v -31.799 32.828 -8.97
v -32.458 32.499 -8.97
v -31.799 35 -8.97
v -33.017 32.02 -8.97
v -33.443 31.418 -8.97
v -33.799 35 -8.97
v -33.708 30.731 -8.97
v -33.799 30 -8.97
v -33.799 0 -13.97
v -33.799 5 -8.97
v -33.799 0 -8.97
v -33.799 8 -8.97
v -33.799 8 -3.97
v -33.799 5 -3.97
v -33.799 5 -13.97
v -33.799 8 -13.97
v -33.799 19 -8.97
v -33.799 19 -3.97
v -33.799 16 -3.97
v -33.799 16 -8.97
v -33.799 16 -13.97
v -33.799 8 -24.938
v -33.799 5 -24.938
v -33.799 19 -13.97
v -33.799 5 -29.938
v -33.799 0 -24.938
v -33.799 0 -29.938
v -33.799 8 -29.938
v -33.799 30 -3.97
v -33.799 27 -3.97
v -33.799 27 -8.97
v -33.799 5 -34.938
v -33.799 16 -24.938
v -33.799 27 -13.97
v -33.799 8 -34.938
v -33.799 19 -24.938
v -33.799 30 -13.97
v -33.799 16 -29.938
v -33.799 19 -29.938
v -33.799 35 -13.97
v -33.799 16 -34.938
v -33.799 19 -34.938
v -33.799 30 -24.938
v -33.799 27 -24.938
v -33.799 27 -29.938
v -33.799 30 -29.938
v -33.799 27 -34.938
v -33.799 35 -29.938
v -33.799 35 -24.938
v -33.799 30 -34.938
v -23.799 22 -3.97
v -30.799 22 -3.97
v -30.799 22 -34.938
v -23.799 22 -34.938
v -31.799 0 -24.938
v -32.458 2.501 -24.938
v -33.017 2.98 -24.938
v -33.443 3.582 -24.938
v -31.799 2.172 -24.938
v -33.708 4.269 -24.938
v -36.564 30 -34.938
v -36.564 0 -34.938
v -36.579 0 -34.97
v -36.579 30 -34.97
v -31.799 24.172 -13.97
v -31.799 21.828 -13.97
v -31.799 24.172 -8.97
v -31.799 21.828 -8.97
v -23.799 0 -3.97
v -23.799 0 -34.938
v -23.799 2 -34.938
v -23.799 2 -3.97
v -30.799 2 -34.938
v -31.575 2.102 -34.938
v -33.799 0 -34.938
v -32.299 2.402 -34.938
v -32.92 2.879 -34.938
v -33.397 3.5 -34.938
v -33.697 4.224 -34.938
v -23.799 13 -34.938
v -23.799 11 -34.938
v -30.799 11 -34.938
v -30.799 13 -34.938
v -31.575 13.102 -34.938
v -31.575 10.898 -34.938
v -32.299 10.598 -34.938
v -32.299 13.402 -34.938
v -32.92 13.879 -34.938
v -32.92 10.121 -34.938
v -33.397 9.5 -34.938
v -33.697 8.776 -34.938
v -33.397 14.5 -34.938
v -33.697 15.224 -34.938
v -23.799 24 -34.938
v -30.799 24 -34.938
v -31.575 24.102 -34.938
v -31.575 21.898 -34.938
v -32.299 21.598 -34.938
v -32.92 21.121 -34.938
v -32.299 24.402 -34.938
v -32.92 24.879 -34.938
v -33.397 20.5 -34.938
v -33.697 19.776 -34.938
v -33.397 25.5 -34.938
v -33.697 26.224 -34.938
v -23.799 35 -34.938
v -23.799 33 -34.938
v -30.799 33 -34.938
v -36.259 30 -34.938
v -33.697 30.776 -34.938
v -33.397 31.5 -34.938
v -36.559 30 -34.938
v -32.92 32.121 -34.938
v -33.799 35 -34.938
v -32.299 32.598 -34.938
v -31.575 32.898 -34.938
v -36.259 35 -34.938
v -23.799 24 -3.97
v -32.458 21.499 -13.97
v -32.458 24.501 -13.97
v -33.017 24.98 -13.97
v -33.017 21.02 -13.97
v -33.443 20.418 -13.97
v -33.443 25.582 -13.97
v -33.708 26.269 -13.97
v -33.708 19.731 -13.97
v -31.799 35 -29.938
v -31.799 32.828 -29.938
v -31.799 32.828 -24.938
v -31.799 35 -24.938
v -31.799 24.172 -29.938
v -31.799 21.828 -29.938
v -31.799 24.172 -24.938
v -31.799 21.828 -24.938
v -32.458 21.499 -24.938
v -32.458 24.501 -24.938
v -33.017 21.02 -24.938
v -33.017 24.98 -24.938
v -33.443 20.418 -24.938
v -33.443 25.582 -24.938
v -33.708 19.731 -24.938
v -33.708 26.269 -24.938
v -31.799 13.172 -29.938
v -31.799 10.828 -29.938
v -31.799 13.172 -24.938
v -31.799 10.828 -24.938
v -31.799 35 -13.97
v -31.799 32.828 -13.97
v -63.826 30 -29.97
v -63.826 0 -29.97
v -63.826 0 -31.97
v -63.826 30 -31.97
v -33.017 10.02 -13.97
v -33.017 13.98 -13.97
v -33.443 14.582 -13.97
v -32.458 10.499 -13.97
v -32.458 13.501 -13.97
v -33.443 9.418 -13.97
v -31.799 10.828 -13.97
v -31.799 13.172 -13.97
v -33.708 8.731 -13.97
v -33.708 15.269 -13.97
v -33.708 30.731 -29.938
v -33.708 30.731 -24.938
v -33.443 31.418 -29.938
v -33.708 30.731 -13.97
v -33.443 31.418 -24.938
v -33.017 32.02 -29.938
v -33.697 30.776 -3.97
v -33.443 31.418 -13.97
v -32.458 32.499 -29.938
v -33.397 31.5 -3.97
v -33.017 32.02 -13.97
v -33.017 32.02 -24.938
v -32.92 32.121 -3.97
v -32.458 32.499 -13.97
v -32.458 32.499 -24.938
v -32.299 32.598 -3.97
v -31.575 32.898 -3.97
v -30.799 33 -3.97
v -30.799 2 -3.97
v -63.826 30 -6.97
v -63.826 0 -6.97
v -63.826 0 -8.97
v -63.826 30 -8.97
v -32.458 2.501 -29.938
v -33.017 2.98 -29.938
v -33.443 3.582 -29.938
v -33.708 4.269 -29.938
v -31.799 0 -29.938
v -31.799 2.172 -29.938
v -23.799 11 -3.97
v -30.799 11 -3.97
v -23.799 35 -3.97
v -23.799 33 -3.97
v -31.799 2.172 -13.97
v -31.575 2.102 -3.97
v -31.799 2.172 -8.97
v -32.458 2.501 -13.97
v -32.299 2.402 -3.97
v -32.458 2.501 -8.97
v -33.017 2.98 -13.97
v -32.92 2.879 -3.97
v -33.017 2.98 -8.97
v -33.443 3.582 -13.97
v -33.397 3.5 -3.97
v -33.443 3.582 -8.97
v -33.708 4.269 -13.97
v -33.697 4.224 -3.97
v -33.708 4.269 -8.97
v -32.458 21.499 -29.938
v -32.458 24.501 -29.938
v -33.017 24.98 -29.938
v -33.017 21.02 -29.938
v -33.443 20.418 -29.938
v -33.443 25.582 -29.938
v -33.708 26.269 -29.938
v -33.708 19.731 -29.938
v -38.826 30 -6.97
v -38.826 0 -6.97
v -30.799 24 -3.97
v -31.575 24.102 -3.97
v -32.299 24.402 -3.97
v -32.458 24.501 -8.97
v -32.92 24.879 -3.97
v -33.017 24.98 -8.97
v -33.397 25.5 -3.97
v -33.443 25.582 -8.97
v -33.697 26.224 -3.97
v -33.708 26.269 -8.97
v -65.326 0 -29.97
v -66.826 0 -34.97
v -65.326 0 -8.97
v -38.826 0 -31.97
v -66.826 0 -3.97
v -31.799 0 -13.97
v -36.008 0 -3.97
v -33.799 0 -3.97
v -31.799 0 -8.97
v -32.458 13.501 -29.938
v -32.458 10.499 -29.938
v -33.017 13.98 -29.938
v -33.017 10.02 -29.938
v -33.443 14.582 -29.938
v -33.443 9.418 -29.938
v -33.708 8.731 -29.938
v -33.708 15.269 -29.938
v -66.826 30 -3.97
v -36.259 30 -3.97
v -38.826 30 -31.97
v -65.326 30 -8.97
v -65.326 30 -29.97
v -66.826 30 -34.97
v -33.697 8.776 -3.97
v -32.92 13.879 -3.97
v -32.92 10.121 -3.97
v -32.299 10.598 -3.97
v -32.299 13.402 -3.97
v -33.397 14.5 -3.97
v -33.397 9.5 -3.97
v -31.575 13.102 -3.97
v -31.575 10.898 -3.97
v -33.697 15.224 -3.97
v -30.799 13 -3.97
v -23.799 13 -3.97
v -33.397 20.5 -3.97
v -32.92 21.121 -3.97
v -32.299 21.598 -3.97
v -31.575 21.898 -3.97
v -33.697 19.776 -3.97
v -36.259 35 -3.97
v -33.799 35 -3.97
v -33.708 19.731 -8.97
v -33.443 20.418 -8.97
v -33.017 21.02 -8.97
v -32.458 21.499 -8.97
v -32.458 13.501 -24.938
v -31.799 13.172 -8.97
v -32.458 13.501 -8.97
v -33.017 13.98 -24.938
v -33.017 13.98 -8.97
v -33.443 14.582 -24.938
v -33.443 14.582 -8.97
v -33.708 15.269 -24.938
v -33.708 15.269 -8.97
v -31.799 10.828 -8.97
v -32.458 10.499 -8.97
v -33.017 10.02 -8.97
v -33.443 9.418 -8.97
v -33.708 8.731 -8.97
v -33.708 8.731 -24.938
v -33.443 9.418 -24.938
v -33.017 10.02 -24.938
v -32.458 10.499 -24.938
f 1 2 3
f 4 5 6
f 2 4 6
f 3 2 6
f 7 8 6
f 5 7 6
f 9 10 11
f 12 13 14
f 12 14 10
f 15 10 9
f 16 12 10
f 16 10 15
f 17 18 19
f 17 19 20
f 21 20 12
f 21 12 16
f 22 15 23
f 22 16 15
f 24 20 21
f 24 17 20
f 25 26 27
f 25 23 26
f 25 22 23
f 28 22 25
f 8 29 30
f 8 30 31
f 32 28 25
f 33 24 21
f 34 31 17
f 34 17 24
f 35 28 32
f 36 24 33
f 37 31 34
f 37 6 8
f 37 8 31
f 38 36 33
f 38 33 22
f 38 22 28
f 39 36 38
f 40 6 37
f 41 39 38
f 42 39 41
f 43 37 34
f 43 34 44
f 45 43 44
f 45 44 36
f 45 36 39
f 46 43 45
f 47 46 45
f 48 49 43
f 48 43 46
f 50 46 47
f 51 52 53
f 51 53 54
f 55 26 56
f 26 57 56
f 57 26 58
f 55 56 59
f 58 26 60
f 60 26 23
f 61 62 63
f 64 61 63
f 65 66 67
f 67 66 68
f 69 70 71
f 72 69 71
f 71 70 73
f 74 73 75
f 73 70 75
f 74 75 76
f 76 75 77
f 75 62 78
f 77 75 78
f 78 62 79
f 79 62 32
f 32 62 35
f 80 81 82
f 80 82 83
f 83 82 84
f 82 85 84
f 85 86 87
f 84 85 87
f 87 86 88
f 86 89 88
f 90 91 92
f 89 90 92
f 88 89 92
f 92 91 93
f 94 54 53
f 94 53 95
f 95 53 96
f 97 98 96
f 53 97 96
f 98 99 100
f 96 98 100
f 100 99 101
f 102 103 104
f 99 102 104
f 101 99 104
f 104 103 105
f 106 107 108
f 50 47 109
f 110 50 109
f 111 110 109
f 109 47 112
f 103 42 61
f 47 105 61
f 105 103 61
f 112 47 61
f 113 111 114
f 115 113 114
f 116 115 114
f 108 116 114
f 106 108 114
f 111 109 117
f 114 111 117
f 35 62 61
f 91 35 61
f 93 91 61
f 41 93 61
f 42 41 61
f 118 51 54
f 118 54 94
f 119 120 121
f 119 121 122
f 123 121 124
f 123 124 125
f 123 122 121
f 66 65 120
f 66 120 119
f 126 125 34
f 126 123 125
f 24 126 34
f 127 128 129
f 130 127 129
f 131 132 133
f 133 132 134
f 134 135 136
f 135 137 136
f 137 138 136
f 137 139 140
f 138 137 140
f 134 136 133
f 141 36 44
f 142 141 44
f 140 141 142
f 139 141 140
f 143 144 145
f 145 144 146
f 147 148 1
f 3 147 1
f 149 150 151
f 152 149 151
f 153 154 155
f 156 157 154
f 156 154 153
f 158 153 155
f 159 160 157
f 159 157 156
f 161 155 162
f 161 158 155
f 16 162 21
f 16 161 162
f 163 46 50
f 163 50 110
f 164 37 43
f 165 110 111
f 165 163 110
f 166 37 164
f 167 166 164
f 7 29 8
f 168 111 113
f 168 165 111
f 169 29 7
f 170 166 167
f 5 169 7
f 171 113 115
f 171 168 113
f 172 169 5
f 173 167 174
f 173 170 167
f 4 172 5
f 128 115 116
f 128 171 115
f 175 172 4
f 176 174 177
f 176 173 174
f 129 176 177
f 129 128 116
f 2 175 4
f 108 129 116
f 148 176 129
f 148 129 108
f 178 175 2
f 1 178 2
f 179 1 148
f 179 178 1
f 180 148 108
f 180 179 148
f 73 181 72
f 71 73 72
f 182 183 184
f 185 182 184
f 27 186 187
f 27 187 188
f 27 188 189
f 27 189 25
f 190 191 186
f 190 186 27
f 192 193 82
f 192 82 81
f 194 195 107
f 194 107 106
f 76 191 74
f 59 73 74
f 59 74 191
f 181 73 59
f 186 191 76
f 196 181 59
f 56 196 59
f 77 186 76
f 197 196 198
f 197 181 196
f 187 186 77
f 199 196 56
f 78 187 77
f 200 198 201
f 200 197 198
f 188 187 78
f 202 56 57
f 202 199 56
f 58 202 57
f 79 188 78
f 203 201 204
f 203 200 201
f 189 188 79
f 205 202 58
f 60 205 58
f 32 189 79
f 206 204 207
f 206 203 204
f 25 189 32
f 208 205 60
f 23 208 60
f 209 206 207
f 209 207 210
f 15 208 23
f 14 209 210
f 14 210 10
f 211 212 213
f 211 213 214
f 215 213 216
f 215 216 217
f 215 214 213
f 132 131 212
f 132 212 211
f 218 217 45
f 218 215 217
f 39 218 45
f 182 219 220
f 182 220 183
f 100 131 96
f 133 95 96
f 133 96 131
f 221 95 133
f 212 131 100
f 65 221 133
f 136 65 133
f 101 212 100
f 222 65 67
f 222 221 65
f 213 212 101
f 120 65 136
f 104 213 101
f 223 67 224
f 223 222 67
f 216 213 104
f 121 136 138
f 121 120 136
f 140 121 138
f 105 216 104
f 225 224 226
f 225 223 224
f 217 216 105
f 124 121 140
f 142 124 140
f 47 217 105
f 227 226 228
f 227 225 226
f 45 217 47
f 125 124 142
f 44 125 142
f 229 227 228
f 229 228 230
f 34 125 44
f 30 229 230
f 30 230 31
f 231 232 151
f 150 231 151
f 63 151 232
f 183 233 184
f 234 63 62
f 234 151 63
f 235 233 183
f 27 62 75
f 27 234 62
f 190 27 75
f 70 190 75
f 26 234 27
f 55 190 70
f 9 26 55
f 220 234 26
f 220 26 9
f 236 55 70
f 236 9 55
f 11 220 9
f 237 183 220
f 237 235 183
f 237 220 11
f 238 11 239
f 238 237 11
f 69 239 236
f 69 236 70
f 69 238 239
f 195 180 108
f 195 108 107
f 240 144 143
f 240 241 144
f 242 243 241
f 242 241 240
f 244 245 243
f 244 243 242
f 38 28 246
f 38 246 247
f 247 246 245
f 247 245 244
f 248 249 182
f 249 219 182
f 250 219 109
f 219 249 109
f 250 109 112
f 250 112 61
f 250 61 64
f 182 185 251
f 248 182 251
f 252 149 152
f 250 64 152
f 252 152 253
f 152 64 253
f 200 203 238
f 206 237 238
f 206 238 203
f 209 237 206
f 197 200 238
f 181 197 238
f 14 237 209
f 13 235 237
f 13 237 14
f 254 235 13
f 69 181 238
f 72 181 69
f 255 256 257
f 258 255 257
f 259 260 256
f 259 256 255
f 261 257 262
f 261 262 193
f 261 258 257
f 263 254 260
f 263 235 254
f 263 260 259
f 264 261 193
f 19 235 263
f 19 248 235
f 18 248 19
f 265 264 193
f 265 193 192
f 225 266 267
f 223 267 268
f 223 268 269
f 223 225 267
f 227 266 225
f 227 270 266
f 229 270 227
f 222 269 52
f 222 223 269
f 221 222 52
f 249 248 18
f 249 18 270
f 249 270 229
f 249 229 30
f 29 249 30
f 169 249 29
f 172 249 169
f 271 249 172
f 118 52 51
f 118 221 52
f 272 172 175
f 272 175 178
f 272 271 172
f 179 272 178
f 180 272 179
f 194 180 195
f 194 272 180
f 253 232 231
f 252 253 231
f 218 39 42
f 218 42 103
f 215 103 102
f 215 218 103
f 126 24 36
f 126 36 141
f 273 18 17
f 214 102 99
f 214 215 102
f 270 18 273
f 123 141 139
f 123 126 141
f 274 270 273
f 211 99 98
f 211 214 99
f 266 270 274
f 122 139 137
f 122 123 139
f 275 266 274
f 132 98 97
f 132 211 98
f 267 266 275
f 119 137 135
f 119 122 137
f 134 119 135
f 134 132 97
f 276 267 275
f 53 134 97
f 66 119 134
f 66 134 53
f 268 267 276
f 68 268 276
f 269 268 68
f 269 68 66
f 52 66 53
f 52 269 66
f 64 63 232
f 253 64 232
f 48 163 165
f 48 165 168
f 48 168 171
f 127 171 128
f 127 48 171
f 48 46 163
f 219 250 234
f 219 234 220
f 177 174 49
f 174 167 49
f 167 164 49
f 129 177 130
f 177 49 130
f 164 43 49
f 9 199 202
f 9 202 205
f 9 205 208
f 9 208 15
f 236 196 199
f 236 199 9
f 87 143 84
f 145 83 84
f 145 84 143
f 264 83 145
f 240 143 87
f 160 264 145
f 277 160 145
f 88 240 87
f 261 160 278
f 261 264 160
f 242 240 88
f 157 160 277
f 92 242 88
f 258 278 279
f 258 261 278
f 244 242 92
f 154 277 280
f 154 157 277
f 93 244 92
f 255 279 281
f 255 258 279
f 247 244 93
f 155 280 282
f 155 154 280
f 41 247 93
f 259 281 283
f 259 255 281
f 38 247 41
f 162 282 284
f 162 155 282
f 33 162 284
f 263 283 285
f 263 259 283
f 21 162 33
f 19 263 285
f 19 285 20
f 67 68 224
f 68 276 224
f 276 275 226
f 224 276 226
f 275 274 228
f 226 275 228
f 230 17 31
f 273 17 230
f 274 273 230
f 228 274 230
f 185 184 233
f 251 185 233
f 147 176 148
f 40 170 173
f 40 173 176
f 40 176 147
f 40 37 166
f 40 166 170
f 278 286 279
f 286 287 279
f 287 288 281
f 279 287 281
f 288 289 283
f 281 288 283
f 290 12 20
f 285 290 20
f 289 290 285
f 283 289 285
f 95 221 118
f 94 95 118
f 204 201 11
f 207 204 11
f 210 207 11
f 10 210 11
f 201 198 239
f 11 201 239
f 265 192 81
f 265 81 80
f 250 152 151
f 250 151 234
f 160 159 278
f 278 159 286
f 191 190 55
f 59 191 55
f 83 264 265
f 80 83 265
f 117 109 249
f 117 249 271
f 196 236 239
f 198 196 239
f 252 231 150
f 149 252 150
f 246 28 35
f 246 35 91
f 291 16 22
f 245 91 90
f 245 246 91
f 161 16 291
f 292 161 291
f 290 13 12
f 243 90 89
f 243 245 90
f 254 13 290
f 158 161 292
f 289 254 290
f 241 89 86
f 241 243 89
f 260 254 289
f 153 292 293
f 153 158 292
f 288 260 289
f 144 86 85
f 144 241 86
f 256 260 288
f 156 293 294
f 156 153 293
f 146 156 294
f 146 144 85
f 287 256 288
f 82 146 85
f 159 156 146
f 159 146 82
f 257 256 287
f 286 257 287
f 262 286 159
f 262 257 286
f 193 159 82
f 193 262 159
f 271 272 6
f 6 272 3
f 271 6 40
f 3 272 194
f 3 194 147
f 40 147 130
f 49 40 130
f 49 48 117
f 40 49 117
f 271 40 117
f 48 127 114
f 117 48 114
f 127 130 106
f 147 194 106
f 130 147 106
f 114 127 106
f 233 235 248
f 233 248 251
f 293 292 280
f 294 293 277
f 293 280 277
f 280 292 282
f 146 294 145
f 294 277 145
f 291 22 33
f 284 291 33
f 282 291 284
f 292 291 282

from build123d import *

# Parameters (mm, degrees)
EXTRUDE_1_DEPTH      = 30
CUT_EXTRUDE_4_DEPTH  = 82.16997337
SKETCH_7_W           = 16.60831278
SKETCH_7_H           = 38.473598513
CUT_EXTRUDE_14_DEPTH = 82.16997337
SKETCH_8_W           = 5
SKETCH_8_H           = 30.968526609
EXTRUDE_2_DEPTH      = 30
SKETCH_12_W          = 30.968526609
SKETCH_12_H          = 5
EXTRUDE_11_DEPTH     = 2.76
SKETCH_13_W          = 10
SKETCH_13_H          = 2
EXTRUDE_12_DEPTH     = 30.968526609
SKETCH_14_W          = 2
SKETCH_14_H          = 5
CUT_EXTRUDE_15_DEPTH = 84.147847698
FILLET_1_R           = 3
SKETCH_15_W          = 0.3
SKETCH_15_H          = 5
CUT_EXTRUDE_17_DEPTH = 82.55784374


with BuildPart() as part:
    # Эскиз1 → Бобышка-Вытянуть1 (new body)
    with BuildSketch(Plane(origin=(0, 0, 0), x_dir=(1, 0, 0), z_dir=(0, 1, 0))):
        Polygon((-66.825757576, 34.969739794), (-66.825757576, 29.969739794), (-63.825757576, 29.969739794), (-63.825757576, 31.969739794), (-38.825757576, 31.969739794), (-38.825757576, 6.969739794), (-63.825757576, 6.969739794), (-63.825757576, 8.969739794), (-66.825757576, 8.969739794), (-66.825757576, 3.969739794), (-22.123470102, 3.969739794), (-36.579007505, 34.969739794), align=None)
    extrude(amount=EXTRUDE_1_DEPTH)

    # Эскиз3 → Вырез-Вытянуть4 (cut, through all)
    with BuildSketch(Plane.XZ):
        Polygon((-66.825757576, -3.969739794), (-65.325757576, -8.969739794), (-66.825757576, -8.969739794), align=None)
        Polygon((-66.825757576, -29.969739794), (-66.825757576, -34.969739794), (-65.325757576, -29.969739794), align=None)
    extrude(amount=-CUT_EXTRUDE_4_DEPTH, mode=Mode.SUBTRACT)

    # Эскиз7 → Вырез-Вытянуть14 (cut, through all)
    with BuildSketch(Plane(origin=(0, 0, 0), x_dir=(-1, 0, 0), z_dir=(0, -1, 0))):
        with Locations((27.703474463, 20.539743139)):
            Rectangle(SKETCH_7_W, SKETCH_7_H)
    extrude(amount=-CUT_EXTRUDE_14_DEPTH, mode=Mode.SUBTRACT)

    # Эскиз8 → Бобышка-Вытянуть2 (add)
    with BuildSketch(Plane(origin=(0, 0, 0), x_dir=(-1, 0, 0), z_dir=(0, -1, 0))):
        with Locations((36.298943925, 19.454003098)):
            Rectangle(SKETCH_8_W, SKETCH_8_H)
    extrude(amount=-EXTRUDE_2_DEPTH)

    # Эскиз12 → Бобышка-Вытянуть11 (add)
    with BuildSketch(Plane(origin=(-33.798943925, 0, 0), x_dir=(0, 0, -1), z_dir=(1, 0, 0))):
        with Locations((19.454003098, 32.5)):
            Rectangle(SKETCH_12_W, SKETCH_12_H)
    extrude(amount=-EXTRUDE_11_DEPTH)

    # Эскиз13 → Бобышка-Вытянуть12 (add)
    with BuildSketch(Plane.XY.offset(-3.969739794)):
        with Locations((-28.798943925, 1)):
            Rectangle(SKETCH_13_W, SKETCH_13_H)
        with Locations((-28.798943925, 12)):
            Rectangle(SKETCH_13_W, SKETCH_13_H)
        with Locations((-28.798943925, 23)):
            Rectangle(SKETCH_13_W, SKETCH_13_H)
        with Locations((-28.798943925, 34)):
            Rectangle(SKETCH_13_W, SKETCH_13_H)
    extrude(amount=-EXTRUDE_12_DEPTH)

    # Эскиз14 → Вырез-Вытянуть15 (cut, through all)
    with BuildSketch(Plane(origin=(0, 35, 0), x_dir=(1, 0, 0), z_dir=(0, 1, 0))):
        with Locations((-32.798943925, 27.438266403)):
            Rectangle(SKETCH_14_W, SKETCH_14_H)
        with Locations((-32.798943925, 11.469739794)):
            Rectangle(SKETCH_14_W, SKETCH_14_H)
    extrude(amount=-CUT_EXTRUDE_15_DEPTH, mode=Mode.SUBTRACT)

    # Скругление1
    # the kernel refuses this fillet: 3 mm, written as the material it adds along each edge
    with BuildSketch(Plane(origin=(-33.798943925, 2, -22.438266403), x_dir=(0, 1, 0), z_dir=(0, 0, -1))) as fillet_1_piece_1_section:
        with BuildLine():
            CenterArc((FILLET_1_R, FILLET_1_R), FILLET_1_R, 180, 90)
            Line((0, FILLET_1_R), (0, 0))
            Line((0, 0), (FILLET_1_R, 0))
        make_face()
    fillet_1_piece_1 = extrude(amount=20, mode=Mode.PRIVATE)
    fillet_1_piece_1 = split(fillet_1_piece_1, bisect_by=Plane(origin=(-33.176423652, 2.688760919, -24.938266403), z_dir=(0, 0, 1)), keep=Keep.TOP, mode=Mode.PRIVATE)
    add(fillet_1_piece_1)
    with BuildSketch(Plane(origin=(-33.798943925, 2, -22.438266403), x_dir=(0, 1, 0), z_dir=(0, 0, -1))) as fillet_1_piece_2_section:
        with BuildLine():
            CenterArc((FILLET_1_R, FILLET_1_R), FILLET_1_R, 180, 90)
            Line((0, FILLET_1_R), (0, 0))
            Line((0, 0), (FILLET_1_R, 0))
        make_face()
    fillet_1_piece_2 = extrude(amount=12.5, mode=Mode.PRIVATE)
    fillet_1_piece_2 = split(fillet_1_piece_2, bisect_by=Plane(origin=(-31.798943925, 2.051209323, -27.438266403), z_dir=(1, 0, 0)), keep=Keep.TOP, mode=Mode.PRIVATE)
    add(fillet_1_piece_2)
    with BuildSketch(Plane(origin=(-33.798943925, 2, -29.938266403), x_dir=(0, 1, 0), z_dir=(0, 0, -1)), Plane(origin=(-33.798943925, 13, -29.938266403), x_dir=(0, 1, 0), z_dir=(0, 0, -1)), Plane(origin=(-33.798943925, 24, -29.938266403), x_dir=(0, 1, 0), z_dir=(0, 0, -1)), Plane(origin=(-33.798943925, 24, -3.969739794), x_dir=(0, 1, 0), z_dir=(0, 0, -1)), Plane(origin=(-33.798943925, 13, -3.969739794), x_dir=(0, 1, 0), z_dir=(0, 0, -1)), Plane(origin=(-33.798943925, 2, -3.969739794), x_dir=(0, 1, 0), z_dir=(0, 0, -1))) as fillet_1_piece_3:
        with BuildLine():
            CenterArc((FILLET_1_R, FILLET_1_R), FILLET_1_R, 180, 90)
            Line((0, FILLET_1_R), (0, 0))
            Line((0, 0), (FILLET_1_R, 0))
        make_face()
    extrude(amount=5)
    with BuildSketch(Plane(origin=(-33.798943925, 13, -22.438266403), x_dir=(0, 1, 0), z_dir=(0, 0, -1))) as fillet_1_piece_4_section:
        with BuildLine():
            CenterArc((FILLET_1_R, FILLET_1_R), FILLET_1_R, 180, 90)
            Line((0, FILLET_1_R), (0, 0))
            Line((0, 0), (FILLET_1_R, 0))
        make_face()
    fillet_1_piece_4 = extrude(amount=20, mode=Mode.PRIVATE)
    fillet_1_piece_4 = split(fillet_1_piece_4, bisect_by=Plane(origin=(-33.176423652, 13.688760919, -24.938266403), z_dir=(0, 0, 1)), keep=Keep.TOP, mode=Mode.PRIVATE)
    add(fillet_1_piece_4)
    with BuildSketch(Plane(origin=(-33.798943925, 13, -22.438266403), x_dir=(0, 1, 0), z_dir=(0, 0, -1))) as fillet_1_piece_5_section:
        with BuildLine():
            CenterArc((FILLET_1_R, FILLET_1_R), FILLET_1_R, 180, 90)
            Line((0, FILLET_1_R), (0, 0))
            Line((0, 0), (FILLET_1_R, 0))
        make_face()
    fillet_1_piece_5 = extrude(amount=12.5, mode=Mode.PRIVATE)
    fillet_1_piece_5 = split(fillet_1_piece_5, bisect_by=Plane(origin=(-31.798943925, 13.051209323, -27.438266403), z_dir=(1, 0, 0)), keep=Keep.TOP, mode=Mode.PRIVATE)
    add(fillet_1_piece_5)
    with BuildSketch(Plane(origin=(-33.798943925, 11, -22.438266403), x_dir=(0, -1, 0), z_dir=(0, 0, -1))) as fillet_1_piece_6_section:
        with BuildLine():
            CenterArc((FILLET_1_R, -FILLET_1_R), FILLET_1_R, 90, 90)
            Line((0, -FILLET_1_R), (0, 0))
            Line((0, 0), (FILLET_1_R, 0))
        make_face()
    fillet_1_piece_6 = extrude(amount=20, mode=Mode.PRIVATE)
    fillet_1_piece_6 = split(fillet_1_piece_6, bisect_by=Plane(origin=(-33.176423652, 10.311239081, -24.938266403), z_dir=(0, 0, 1)), keep=Keep.TOP, mode=Mode.PRIVATE)
    add(fillet_1_piece_6)
    with BuildSketch(Plane(origin=(-33.798943925, 11, -22.438266403), x_dir=(0, -1, 0), z_dir=(0, 0, -1))) as fillet_1_piece_7_section:
        with BuildLine():
            CenterArc((FILLET_1_R, -FILLET_1_R), FILLET_1_R, 90, 90)
            Line((0, -FILLET_1_R), (0, 0))
            Line((0, 0), (FILLET_1_R, 0))
        make_face()
    fillet_1_piece_7 = extrude(amount=12.5, mode=Mode.PRIVATE)
    fillet_1_piece_7 = split(fillet_1_piece_7, bisect_by=Plane(origin=(-31.798943925, 10.948790677, -27.438266403), z_dir=(1, 0, 0)), keep=Keep.TOP, mode=Mode.PRIVATE)
    add(fillet_1_piece_7)
    with BuildSketch(Plane(origin=(-33.798943925, 11, -29.938266403), x_dir=(0, -1, 0), z_dir=(0, 0, -1)), Plane(origin=(-33.798943925, 22, -29.938266403), x_dir=(0, -1, 0), z_dir=(0, 0, -1)), Plane(origin=(-33.798943925, 33, -29.938266403), x_dir=(0, -1, 0), z_dir=(0, 0, -1)), Plane(origin=(-33.798943925, 33, -3.969739794), x_dir=(0, -1, 0), z_dir=(0, 0, -1)), Plane(origin=(-33.798943925, 22, -3.969739794), x_dir=(0, -1, 0), z_dir=(0, 0, -1)), Plane(origin=(-33.798943925, 11, -3.969739794), x_dir=(0, -1, 0), z_dir=(0, 0, -1))) as fillet_1_piece_8:
        with BuildLine():
            CenterArc((FILLET_1_R, -FILLET_1_R), FILLET_1_R, 90, 90)
            Line((0, -FILLET_1_R), (0, 0))
            Line((0, 0), (FILLET_1_R, 0))
        make_face()
    extrude(amount=5)
    with BuildSketch(Plane(origin=(-33.798943925, 24, -22.438266403), x_dir=(0, 1, 0), z_dir=(0, 0, -1))) as fillet_1_piece_9_section:
        with BuildLine():
            CenterArc((FILLET_1_R, FILLET_1_R), FILLET_1_R, 180, 90)
            Line((0, FILLET_1_R), (0, 0))
            Line((0, 0), (FILLET_1_R, 0))
        make_face()
    fillet_1_piece_9 = extrude(amount=20, mode=Mode.PRIVATE)
    fillet_1_piece_9 = split(fillet_1_piece_9, bisect_by=Plane(origin=(-33.176423652, 24.688760919, -24.938266403), z_dir=(0, 0, 1)), keep=Keep.TOP, mode=Mode.PRIVATE)
    add(fillet_1_piece_9)
    with BuildSketch(Plane(origin=(-33.798943925, 24, -22.438266403), x_dir=(0, 1, 0), z_dir=(0, 0, -1))) as fillet_1_piece_10_section:
        with BuildLine():
            CenterArc((FILLET_1_R, FILLET_1_R), FILLET_1_R, 180, 90)
            Line((0, FILLET_1_R), (0, 0))
            Line((0, 0), (FILLET_1_R, 0))
        make_face()
    fillet_1_piece_10 = extrude(amount=12.5, mode=Mode.PRIVATE)
    fillet_1_piece_10 = split(fillet_1_piece_10, bisect_by=Plane(origin=(-31.798943925, 24.051209323, -27.438266403), z_dir=(1, 0, 0)), keep=Keep.TOP, mode=Mode.PRIVATE)
    add(fillet_1_piece_10)
    with BuildSketch(Plane(origin=(-33.798943925, 22, -22.438266403), x_dir=(0, -1, 0), z_dir=(0, 0, -1))) as fillet_1_piece_11_section:
        with BuildLine():
            CenterArc((FILLET_1_R, -FILLET_1_R), FILLET_1_R, 90, 90)
            Line((0, -FILLET_1_R), (0, 0))
            Line((0, 0), (FILLET_1_R, 0))
        make_face()
    fillet_1_piece_11 = extrude(amount=20, mode=Mode.PRIVATE)
    fillet_1_piece_11 = split(fillet_1_piece_11, bisect_by=Plane(origin=(-33.176423652, 21.311239081, -24.938266403), z_dir=(0, 0, 1)), keep=Keep.TOP, mode=Mode.PRIVATE)
    add(fillet_1_piece_11)
    with BuildSketch(Plane(origin=(-33.798943925, 22, -22.438266403), x_dir=(0, -1, 0), z_dir=(0, 0, -1))) as fillet_1_piece_12_section:
        with BuildLine():
            CenterArc((FILLET_1_R, -FILLET_1_R), FILLET_1_R, 90, 90)
            Line((0, -FILLET_1_R), (0, 0))
            Line((0, 0), (FILLET_1_R, 0))
        make_face()
    fillet_1_piece_12 = extrude(amount=12.5, mode=Mode.PRIVATE)
    fillet_1_piece_12 = split(fillet_1_piece_12, bisect_by=Plane(origin=(-31.798943925, 21.948790677, -27.438266403), z_dir=(1, 0, 0)), keep=Keep.TOP, mode=Mode.PRIVATE)
    add(fillet_1_piece_12)
    with BuildSketch(Plane(origin=(-33.798943925, 33, -22.438266403), x_dir=(0, -1, 0), z_dir=(0, 0, -1))) as fillet_1_piece_13_section:
        with BuildLine():
            CenterArc((FILLET_1_R, -FILLET_1_R), FILLET_1_R, 90, 90)
            Line((0, -FILLET_1_R), (0, 0))
            Line((0, 0), (FILLET_1_R, 0))
        make_face()
    fillet_1_piece_13 = extrude(amount=20, mode=Mode.PRIVATE)
    fillet_1_piece_13 = split(fillet_1_piece_13, bisect_by=Plane(origin=(-33.176423652, 32.311239081, -24.938266403), z_dir=(0, 0, 1)), keep=Keep.TOP, mode=Mode.PRIVATE)
    add(fillet_1_piece_13)
    with BuildSketch(Plane(origin=(-33.798943925, 33, -22.438266403), x_dir=(0, -1, 0), z_dir=(0, 0, -1))) as fillet_1_piece_14_section:
        with BuildLine():
            CenterArc((FILLET_1_R, -FILLET_1_R), FILLET_1_R, 90, 90)
            Line((0, -FILLET_1_R), (0, 0))
            Line((0, 0), (FILLET_1_R, 0))
        make_face()
    fillet_1_piece_14 = extrude(amount=12.5, mode=Mode.PRIVATE)
    fillet_1_piece_14 = split(fillet_1_piece_14, bisect_by=Plane(origin=(-31.798943925, 32.948790677, -27.438266403), z_dir=(1, 0, 0)), keep=Keep.TOP, mode=Mode.PRIVATE)
    add(fillet_1_piece_14)
    with BuildSketch(Plane(origin=(-33.798943925, 33, -6.469739794), x_dir=(0, -1, 0), z_dir=(0, 0, -1))) as fillet_1_piece_15_section:
        with BuildLine():
            CenterArc((FILLET_1_R, -FILLET_1_R), FILLET_1_R, 90, 90)
            Line((0, -FILLET_1_R), (0, 0))
            Line((0, 0), (FILLET_1_R, 0))
        make_face()
    fillet_1_piece_15 = extrude(amount=25.968526609, mode=Mode.PRIVATE)
    fillet_1_piece_15 = split(fillet_1_piece_15, bisect_by=Plane(origin=(-33.176423652, 32.311239081, -8.969739794), z_dir=(0, 0, 1)), keep=Keep.TOP, mode=Mode.PRIVATE)
    add(fillet_1_piece_15)
    with BuildSketch(Plane(origin=(-33.798943925, 33, -6.469739794), x_dir=(0, -1, 0), z_dir=(0, 0, -1))) as fillet_1_piece_16_section:
        with BuildLine():
            CenterArc((FILLET_1_R, -FILLET_1_R), FILLET_1_R, 90, 90)
            Line((0, -FILLET_1_R), (0, 0))
            Line((0, 0), (FILLET_1_R, 0))
        make_face()
    fillet_1_piece_16 = extrude(amount=25.968526609, mode=Mode.PRIVATE)
    fillet_1_piece_16 = split(fillet_1_piece_16, bisect_by=Plane(origin=(-31.798943925, 32.948790677, -11.469739794), z_dir=(1, 0, 0)), keep=Keep.TOP, mode=Mode.PRIVATE)
    add(fillet_1_piece_16)
    with BuildSketch(Plane(origin=(-33.798943925, 33, -13.969739794), x_dir=(0, -1, 0), z_dir=(0, 0, -1)), Plane(origin=(-33.798943925, 22, -13.969739794), x_dir=(0, -1, 0), z_dir=(0, 0, -1)), Plane(origin=(-33.798943925, 11, -13.969739794), x_dir=(0, -1, 0), z_dir=(0, 0, -1))) as fillet_1_piece_17:
        with BuildLine():
            CenterArc((FILLET_1_R, -FILLET_1_R), FILLET_1_R, 90, 90)
            Line((0, -FILLET_1_R), (0, 0))
            Line((0, 0), (FILLET_1_R, 0))
        make_face()
    extrude(amount=10.968526609)
    with BuildSketch(Plane(origin=(-33.798943925, 33, -6.469739794), x_dir=(0, -1, 0), z_dir=(0, 0, -1))) as fillet_1_piece_18_section:
        with BuildLine():
            CenterArc((FILLET_1_R, -FILLET_1_R), FILLET_1_R, 90, 90)
            Line((0, -FILLET_1_R), (0, 0))
            Line((0, 0), (FILLET_1_R, 0))
        make_face()
    fillet_1_piece_18 = extrude(amount=25.968526609, mode=Mode.PRIVATE)
    fillet_1_piece_18 = split(fillet_1_piece_18, bisect_by=Plane(origin=(-33.176423652, 32.311239081, -29.938266403), z_dir=(0, 0, -1)), keep=Keep.TOP, mode=Mode.PRIVATE)
    add(fillet_1_piece_18)
    with BuildSketch(Plane(origin=(-33.798943925, 33, 3.530260206), x_dir=(0, -1, 0), z_dir=(0, 0, -1))) as fillet_1_piece_19_section:
        with BuildLine():
            CenterArc((FILLET_1_R, -FILLET_1_R), FILLET_1_R, 90, 90)
            Line((0, -FILLET_1_R), (0, 0))
            Line((0, 0), (FILLET_1_R, 0))
        make_face()
    fillet_1_piece_19 = extrude(amount=20, mode=Mode.PRIVATE)
    fillet_1_piece_19 = split(fillet_1_piece_19, bisect_by=Plane(origin=(-31.550396037, 32.948790677, -8.969739794), z_dir=(0, 0, -1)), keep=Keep.TOP, mode=Mode.PRIVATE)
    fillet_1_piece_19 = split(fillet_1_piece_19, bisect_by=Plane(origin=(-31.798943925, 32.948790677, -11.469739794), z_dir=(1, 0, 0)), keep=Keep.TOP, mode=Mode.PRIVATE)
    add(fillet_1_piece_19)
    with BuildSketch(Plane(origin=(-33.798943925, 33, 3.530260206), x_dir=(0, -1, 0), z_dir=(0, 0, -1))) as fillet_1_piece_20_section:
        with BuildLine():
            CenterArc((FILLET_1_R, -FILLET_1_R), FILLET_1_R, 90, 90)
            Line((0, -FILLET_1_R), (0, 0))
            Line((0, 0), (FILLET_1_R, 0))
        make_face()
    fillet_1_piece_20 = extrude(amount=20, mode=Mode.PRIVATE)
    fillet_1_piece_20 = split(fillet_1_piece_20, bisect_by=Plane(origin=(-33.176423652, 32.311239081, -13.969739794), z_dir=(0, 0, -1)), keep=Keep.TOP, mode=Mode.PRIVATE)
    add(fillet_1_piece_20)
    with BuildSketch(Plane(origin=(-33.798943925, 24, -6.469739794), x_dir=(0, 1, 0), z_dir=(0, 0, -1))) as fillet_1_piece_21_section:
        with BuildLine():
            CenterArc((FILLET_1_R, FILLET_1_R), FILLET_1_R, 180, 90)
            Line((0, FILLET_1_R), (0, 0))
            Line((0, 0), (FILLET_1_R, 0))
        make_face()
    fillet_1_piece_21 = extrude(amount=25.968526609, mode=Mode.PRIVATE)
    fillet_1_piece_21 = split(fillet_1_piece_21, bisect_by=Plane(origin=(-33.176423652, 24.688760919, -8.969739794), z_dir=(0, 0, 1)), keep=Keep.TOP, mode=Mode.PRIVATE)
    add(fillet_1_piece_21)
    with BuildSketch(Plane(origin=(-33.798943925, 24, -6.469739794), x_dir=(0, 1, 0), z_dir=(0, 0, -1))) as fillet_1_piece_22_section:
        with BuildLine():
            CenterArc((FILLET_1_R, FILLET_1_R), FILLET_1_R, 180, 90)
            Line((0, FILLET_1_R), (0, 0))
            Line((0, 0), (FILLET_1_R, 0))
        make_face()
    fillet_1_piece_22 = extrude(amount=25.968526609, mode=Mode.PRIVATE)
    fillet_1_piece_22 = split(fillet_1_piece_22, bisect_by=Plane(origin=(-31.798943925, 24.051209323, -11.469739794), z_dir=(1, 0, 0)), keep=Keep.TOP, mode=Mode.PRIVATE)
    add(fillet_1_piece_22)
    with BuildSketch(Plane(origin=(-33.798943925, 24, -13.969739794), x_dir=(0, 1, 0), z_dir=(0, 0, -1)), Plane(origin=(-33.798943925, 13, -13.969739794), x_dir=(0, 1, 0), z_dir=(0, 0, -1)), Plane(origin=(-33.798943925, 2, -13.969739794), x_dir=(0, 1, 0), z_dir=(0, 0, -1))) as fillet_1_piece_23:
        with BuildLine():
            CenterArc((FILLET_1_R, FILLET_1_R), FILLET_1_R, 180, 90)
            Line((0, FILLET_1_R), (0, 0))
            Line((0, 0), (FILLET_1_R, 0))
        make_face()
    extrude(amount=10.968526609)
    with BuildSketch(Plane(origin=(-33.798943925, 24, -6.469739794), x_dir=(0, 1, 0), z_dir=(0, 0, -1))) as fillet_1_piece_24_section:
        with BuildLine():
            CenterArc((FILLET_1_R, FILLET_1_R), FILLET_1_R, 180, 90)
            Line((0, FILLET_1_R), (0, 0))
            Line((0, 0), (FILLET_1_R, 0))
        make_face()
    fillet_1_piece_24 = extrude(amount=25.968526609, mode=Mode.PRIVATE)
    fillet_1_piece_24 = split(fillet_1_piece_24, bisect_by=Plane(origin=(-33.176423652, 24.688760919, -29.938266403), z_dir=(0, 0, -1)), keep=Keep.TOP, mode=Mode.PRIVATE)
    add(fillet_1_piece_24)
    with BuildSketch(Plane(origin=(-33.798943925, 24, 3.530260206), x_dir=(0, 1, 0), z_dir=(0, 0, -1))) as fillet_1_piece_25_section:
        with BuildLine():
            CenterArc((FILLET_1_R, FILLET_1_R), FILLET_1_R, 180, 90)
            Line((0, FILLET_1_R), (0, 0))
            Line((0, 0), (FILLET_1_R, 0))
        make_face()
    fillet_1_piece_25 = extrude(amount=20, mode=Mode.PRIVATE)
    fillet_1_piece_25 = split(fillet_1_piece_25, bisect_by=Plane(origin=(-31.550396037, 24.051209323, -8.969739794), z_dir=(0, 0, -1)), keep=Keep.TOP, mode=Mode.PRIVATE)
    fillet_1_piece_25 = split(fillet_1_piece_25, bisect_by=Plane(origin=(-31.798943925, 24.051209323, -11.469739794), z_dir=(1, 0, 0)), keep=Keep.TOP, mode=Mode.PRIVATE)
    add(fillet_1_piece_25)
    with BuildSketch(Plane(origin=(-33.798943925, 24, 3.530260206), x_dir=(0, 1, 0), z_dir=(0, 0, -1))) as fillet_1_piece_26_section:
        with BuildLine():
            CenterArc((FILLET_1_R, FILLET_1_R), FILLET_1_R, 180, 90)
            Line((0, FILLET_1_R), (0, 0))
            Line((0, 0), (FILLET_1_R, 0))
        make_face()
    fillet_1_piece_26 = extrude(amount=20, mode=Mode.PRIVATE)
    fillet_1_piece_26 = split(fillet_1_piece_26, bisect_by=Plane(origin=(-33.176423652, 24.688760919, -13.969739794), z_dir=(0, 0, -1)), keep=Keep.TOP, mode=Mode.PRIVATE)
    add(fillet_1_piece_26)
    with BuildSketch(Plane(origin=(-33.798943925, 22, -6.469739794), x_dir=(0, -1, 0), z_dir=(0, 0, -1))) as fillet_1_piece_27_section:
        with BuildLine():
            CenterArc((FILLET_1_R, -FILLET_1_R), FILLET_1_R, 90, 90)
            Line((0, -FILLET_1_R), (0, 0))
            Line((0, 0), (FILLET_1_R, 0))
        make_face()
    fillet_1_piece_27 = extrude(amount=25.968526609, mode=Mode.PRIVATE)
    fillet_1_piece_27 = split(fillet_1_piece_27, bisect_by=Plane(origin=(-33.176423652, 21.311239081, -8.969739794), z_dir=(0, 0, 1)), keep=Keep.TOP, mode=Mode.PRIVATE)
    add(fillet_1_piece_27)
    with BuildSketch(Plane(origin=(-33.798943925, 22, -6.469739794), x_dir=(0, -1, 0), z_dir=(0, 0, -1))) as fillet_1_piece_28_section:
        with BuildLine():
            CenterArc((FILLET_1_R, -FILLET_1_R), FILLET_1_R, 90, 90)
            Line((0, -FILLET_1_R), (0, 0))
            Line((0, 0), (FILLET_1_R, 0))
        make_face()
    fillet_1_piece_28 = extrude(amount=25.968526609, mode=Mode.PRIVATE)
    fillet_1_piece_28 = split(fillet_1_piece_28, bisect_by=Plane(origin=(-31.798943925, 21.948790677, -11.469739794), z_dir=(1, 0, 0)), keep=Keep.TOP, mode=Mode.PRIVATE)
    add(fillet_1_piece_28)
    with BuildSketch(Plane(origin=(-33.798943925, 22, -6.469739794), x_dir=(0, -1, 0), z_dir=(0, 0, -1))) as fillet_1_piece_29_section:
        with BuildLine():
            CenterArc((FILLET_1_R, -FILLET_1_R), FILLET_1_R, 90, 90)
            Line((0, -FILLET_1_R), (0, 0))
            Line((0, 0), (FILLET_1_R, 0))
        make_face()
    fillet_1_piece_29 = extrude(amount=25.968526609, mode=Mode.PRIVATE)
    fillet_1_piece_29 = split(fillet_1_piece_29, bisect_by=Plane(origin=(-33.176423652, 21.311239081, -29.938266403), z_dir=(0, 0, -1)), keep=Keep.TOP, mode=Mode.PRIVATE)
    add(fillet_1_piece_29)
    with BuildSketch(Plane(origin=(-33.798943925, 22, 3.530260206), x_dir=(0, -1, 0), z_dir=(0, 0, -1))) as fillet_1_piece_30_section:
        with BuildLine():
            CenterArc((FILLET_1_R, -FILLET_1_R), FILLET_1_R, 90, 90)
            Line((0, -FILLET_1_R), (0, 0))
            Line((0, 0), (FILLET_1_R, 0))
        make_face()
    fillet_1_piece_30 = extrude(amount=20, mode=Mode.PRIVATE)
    fillet_1_piece_30 = split(fillet_1_piece_30, bisect_by=Plane(origin=(-31.550396037, 21.948790677, -8.969739794), z_dir=(0, 0, -1)), keep=Keep.TOP, mode=Mode.PRIVATE)
    fillet_1_piece_30 = split(fillet_1_piece_30, bisect_by=Plane(origin=(-31.798943925, 21.948790677, -11.469739794), z_dir=(1, 0, 0)), keep=Keep.TOP, mode=Mode.PRIVATE)
    add(fillet_1_piece_30)
    with BuildSketch(Plane(origin=(-33.798943925, 22, 3.530260206), x_dir=(0, -1, 0), z_dir=(0, 0, -1))) as fillet_1_piece_31_section:
        with BuildLine():
            CenterArc((FILLET_1_R, -FILLET_1_R), FILLET_1_R, 90, 90)
            Line((0, -FILLET_1_R), (0, 0))
            Line((0, 0), (FILLET_1_R, 0))
        make_face()
    fillet_1_piece_31 = extrude(amount=20, mode=Mode.PRIVATE)
    fillet_1_piece_31 = split(fillet_1_piece_31, bisect_by=Plane(origin=(-33.176423652, 21.311239081, -13.969739794), z_dir=(0, 0, -1)), keep=Keep.TOP, mode=Mode.PRIVATE)
    add(fillet_1_piece_31)
    with BuildSketch(Plane(origin=(-33.798943925, 13, -6.469739794), x_dir=(0, 1, 0), z_dir=(0, 0, -1))) as fillet_1_piece_32_section:
        with BuildLine():
            CenterArc((FILLET_1_R, FILLET_1_R), FILLET_1_R, 180, 90)
            Line((0, FILLET_1_R), (0, 0))
            Line((0, 0), (FILLET_1_R, 0))
        make_face()
    fillet_1_piece_32 = extrude(amount=25.968526609, mode=Mode.PRIVATE)
    fillet_1_piece_32 = split(fillet_1_piece_32, bisect_by=Plane(origin=(-33.176423652, 13.688760919, -8.969739794), z_dir=(0, 0, 1)), keep=Keep.TOP, mode=Mode.PRIVATE)
    add(fillet_1_piece_32)
    with BuildSketch(Plane(origin=(-33.798943925, 13, -6.469739794), x_dir=(0, 1, 0), z_dir=(0, 0, -1))) as fillet_1_piece_33_section:
        with BuildLine():
            CenterArc((FILLET_1_R, FILLET_1_R), FILLET_1_R, 180, 90)
            Line((0, FILLET_1_R), (0, 0))
            Line((0, 0), (FILLET_1_R, 0))
        make_face()
    fillet_1_piece_33 = extrude(amount=25.968526609, mode=Mode.PRIVATE)
    fillet_1_piece_33 = split(fillet_1_piece_33, bisect_by=Plane(origin=(-31.798943925, 13.051209323, -11.469739794), z_dir=(1, 0, 0)), keep=Keep.TOP, mode=Mode.PRIVATE)
    add(fillet_1_piece_33)
    with BuildSketch(Plane(origin=(-33.798943925, 13, -6.469739794), x_dir=(0, 1, 0), z_dir=(0, 0, -1))) as fillet_1_piece_34_section:
        with BuildLine():
            CenterArc((FILLET_1_R, FILLET_1_R), FILLET_1_R, 180, 90)
            Line((0, FILLET_1_R), (0, 0))
            Line((0, 0), (FILLET_1_R, 0))
        make_face()
    fillet_1_piece_34 = extrude(amount=25.968526609, mode=Mode.PRIVATE)
    fillet_1_piece_34 = split(fillet_1_piece_34, bisect_by=Plane(origin=(-33.176423652, 13.688760919, -29.938266403), z_dir=(0, 0, -1)), keep=Keep.TOP, mode=Mode.PRIVATE)
    add(fillet_1_piece_34)
    with BuildSketch(Plane(origin=(-33.798943925, 13, 3.530260206), x_dir=(0, 1, 0), z_dir=(0, 0, -1))) as fillet_1_piece_35_section:
        with BuildLine():
            CenterArc((FILLET_1_R, FILLET_1_R), FILLET_1_R, 180, 90)
            Line((0, FILLET_1_R), (0, 0))
            Line((0, 0), (FILLET_1_R, 0))
        make_face()
    fillet_1_piece_35 = extrude(amount=20, mode=Mode.PRIVATE)
    fillet_1_piece_35 = split(fillet_1_piece_35, bisect_by=Plane(origin=(-31.550396037, 13.051209323, -8.969739794), z_dir=(0, 0, -1)), keep=Keep.TOP, mode=Mode.PRIVATE)
    fillet_1_piece_35 = split(fillet_1_piece_35, bisect_by=Plane(origin=(-31.798943925, 13.051209323, -11.469739794), z_dir=(1, 0, 0)), keep=Keep.TOP, mode=Mode.PRIVATE)
    add(fillet_1_piece_35)
    with BuildSketch(Plane(origin=(-33.798943925, 13, 3.530260206), x_dir=(0, 1, 0), z_dir=(0, 0, -1))) as fillet_1_piece_36_section:
        with BuildLine():
            CenterArc((FILLET_1_R, FILLET_1_R), FILLET_1_R, 180, 90)
            Line((0, FILLET_1_R), (0, 0))
            Line((0, 0), (FILLET_1_R, 0))
        make_face()
    fillet_1_piece_36 = extrude(amount=20, mode=Mode.PRIVATE)
    fillet_1_piece_36 = split(fillet_1_piece_36, bisect_by=Plane(origin=(-33.176423652, 13.688760919, -13.969739794), z_dir=(0, 0, -1)), keep=Keep.TOP, mode=Mode.PRIVATE)
    add(fillet_1_piece_36)
    with BuildSketch(Plane(origin=(-33.798943925, 11, -6.469739794), x_dir=(0, -1, 0), z_dir=(0, 0, -1))) as fillet_1_piece_37_section:
        with BuildLine():
            CenterArc((FILLET_1_R, -FILLET_1_R), FILLET_1_R, 90, 90)
            Line((0, -FILLET_1_R), (0, 0))
            Line((0, 0), (FILLET_1_R, 0))
        make_face()
    fillet_1_piece_37 = extrude(amount=25.968526609, mode=Mode.PRIVATE)
    fillet_1_piece_37 = split(fillet_1_piece_37, bisect_by=Plane(origin=(-33.176423652, 10.311239081, -8.969739794), z_dir=(0, 0, 1)), keep=Keep.TOP, mode=Mode.PRIVATE)
    add(fillet_1_piece_37)
    with BuildSketch(Plane(origin=(-33.798943925, 11, -6.469739794), x_dir=(0, -1, 0), z_dir=(0, 0, -1))) as fillet_1_piece_38_section:
        with BuildLine():
            CenterArc((FILLET_1_R, -FILLET_1_R), FILLET_1_R, 90, 90)
            Line((0, -FILLET_1_R), (0, 0))
            Line((0, 0), (FILLET_1_R, 0))
        make_face()
    fillet_1_piece_38 = extrude(amount=25.968526609, mode=Mode.PRIVATE)
    fillet_1_piece_38 = split(fillet_1_piece_38, bisect_by=Plane(origin=(-31.798943925, 10.948790677, -11.469739794), z_dir=(1, 0, 0)), keep=Keep.TOP, mode=Mode.PRIVATE)
    add(fillet_1_piece_38)
    with BuildSketch(Plane(origin=(-33.798943925, 11, -6.469739794), x_dir=(0, -1, 0), z_dir=(0, 0, -1))) as fillet_1_piece_39_section:
        with BuildLine():
            CenterArc((FILLET_1_R, -FILLET_1_R), FILLET_1_R, 90, 90)
            Line((0, -FILLET_1_R), (0, 0))
            Line((0, 0), (FILLET_1_R, 0))
        make_face()
    fillet_1_piece_39 = extrude(amount=25.968526609, mode=Mode.PRIVATE)
    fillet_1_piece_39 = split(fillet_1_piece_39, bisect_by=Plane(origin=(-33.176423652, 10.311239081, -29.938266403), z_dir=(0, 0, -1)), keep=Keep.TOP, mode=Mode.PRIVATE)
    add(fillet_1_piece_39)
    with BuildSketch(Plane(origin=(-33.798943925, 11, 3.530260206), x_dir=(0, -1, 0), z_dir=(0, 0, -1))) as fillet_1_piece_40_section:
        with BuildLine():
            CenterArc((FILLET_1_R, -FILLET_1_R), FILLET_1_R, 90, 90)
            Line((0, -FILLET_1_R), (0, 0))
            Line((0, 0), (FILLET_1_R, 0))
        make_face()
    fillet_1_piece_40 = extrude(amount=20, mode=Mode.PRIVATE)
    fillet_1_piece_40 = split(fillet_1_piece_40, bisect_by=Plane(origin=(-31.550396037, 10.948790677, -8.969739794), z_dir=(0, 0, -1)), keep=Keep.TOP, mode=Mode.PRIVATE)
    fillet_1_piece_40 = split(fillet_1_piece_40, bisect_by=Plane(origin=(-31.798943925, 10.948790677, -11.469739794), z_dir=(1, 0, 0)), keep=Keep.TOP, mode=Mode.PRIVATE)
    add(fillet_1_piece_40)
    with BuildSketch(Plane(origin=(-33.798943925, 11, 3.530260206), x_dir=(0, -1, 0), z_dir=(0, 0, -1))) as fillet_1_piece_41_section:
        with BuildLine():
            CenterArc((FILLET_1_R, -FILLET_1_R), FILLET_1_R, 90, 90)
            Line((0, -FILLET_1_R), (0, 0))
            Line((0, 0), (FILLET_1_R, 0))
        make_face()
    fillet_1_piece_41 = extrude(amount=20, mode=Mode.PRIVATE)
    fillet_1_piece_41 = split(fillet_1_piece_41, bisect_by=Plane(origin=(-33.176423652, 10.311239081, -13.969739794), z_dir=(0, 0, -1)), keep=Keep.TOP, mode=Mode.PRIVATE)
    add(fillet_1_piece_41)
    with BuildSketch(Plane(origin=(-33.798943925, 2, -6.469739794), x_dir=(0, 1, 0), z_dir=(0, 0, -1))) as fillet_1_piece_42_section:
        with BuildLine():
            CenterArc((FILLET_1_R, FILLET_1_R), FILLET_1_R, 180, 90)
            Line((0, FILLET_1_R), (0, 0))
            Line((0, 0), (FILLET_1_R, 0))
        make_face()
    fillet_1_piece_42 = extrude(amount=25.968526609, mode=Mode.PRIVATE)
    fillet_1_piece_42 = split(fillet_1_piece_42, bisect_by=Plane(origin=(-33.176423652, 2.688760919, -8.969739794), z_dir=(0, 0, 1)), keep=Keep.TOP, mode=Mode.PRIVATE)
    add(fillet_1_piece_42)
    with BuildSketch(Plane(origin=(-33.798943925, 2, -6.469739794), x_dir=(0, 1, 0), z_dir=(0, 0, -1))) as fillet_1_piece_43_section:
        with BuildLine():
            CenterArc((FILLET_1_R, FILLET_1_R), FILLET_1_R, 180, 90)
            Line((0, FILLET_1_R), (0, 0))
            Line((0, 0), (FILLET_1_R, 0))
        make_face()
    fillet_1_piece_43 = extrude(amount=25.968526609, mode=Mode.PRIVATE)
    fillet_1_piece_43 = split(fillet_1_piece_43, bisect_by=Plane(origin=(-31.798943925, 2.051209323, -11.469739794), z_dir=(1, 0, 0)), keep=Keep.TOP, mode=Mode.PRIVATE)
    add(fillet_1_piece_43)
    with BuildSketch(Plane(origin=(-33.798943925, 2, -6.469739794), x_dir=(0, 1, 0), z_dir=(0, 0, -1))) as fillet_1_piece_44_section:
        with BuildLine():
            CenterArc((FILLET_1_R, FILLET_1_R), FILLET_1_R, 180, 90)
            Line((0, FILLET_1_R), (0, 0))
            Line((0, 0), (FILLET_1_R, 0))
        make_face()
    fillet_1_piece_44 = extrude(amount=25.968526609, mode=Mode.PRIVATE)
    fillet_1_piece_44 = split(fillet_1_piece_44, bisect_by=Plane(origin=(-33.176423652, 2.688760919, -29.938266403), z_dir=(0, 0, -1)), keep=Keep.TOP, mode=Mode.PRIVATE)
    add(fillet_1_piece_44)
    with BuildSketch(Plane(origin=(-33.798943925, 2, 3.530260206), x_dir=(0, 1, 0), z_dir=(0, 0, -1))) as fillet_1_piece_45_section:
        with BuildLine():
            CenterArc((FILLET_1_R, FILLET_1_R), FILLET_1_R, 180, 90)
            Line((0, FILLET_1_R), (0, 0))
            Line((0, 0), (FILLET_1_R, 0))
        make_face()
    fillet_1_piece_45 = extrude(amount=20, mode=Mode.PRIVATE)
    fillet_1_piece_45 = split(fillet_1_piece_45, bisect_by=Plane(origin=(-31.550396037, 2.051209323, -8.969739794), z_dir=(0, 0, -1)), keep=Keep.TOP, mode=Mode.PRIVATE)
    fillet_1_piece_45 = split(fillet_1_piece_45, bisect_by=Plane(origin=(-31.798943925, 2.051209323, -11.469739794), z_dir=(1, 0, 0)), keep=Keep.TOP, mode=Mode.PRIVATE)
    add(fillet_1_piece_45)
    with BuildSketch(Plane(origin=(-33.798943925, 2, 3.530260206), x_dir=(0, 1, 0), z_dir=(0, 0, -1))) as fillet_1_piece_46_section:
        with BuildLine():
            CenterArc((FILLET_1_R, FILLET_1_R), FILLET_1_R, 180, 90)
            Line((0, FILLET_1_R), (0, 0))
            Line((0, 0), (FILLET_1_R, 0))
        make_face()
    fillet_1_piece_46 = extrude(amount=20, mode=Mode.PRIVATE)
    fillet_1_piece_46 = split(fillet_1_piece_46, bisect_by=Plane(origin=(-33.176423652, 2.688760919, -13.969739794), z_dir=(0, 0, -1)), keep=Keep.TOP, mode=Mode.PRIVATE)
    add(fillet_1_piece_46)

    # Эскиз15 → Вырез-Вытянуть17 (cut, through all)
    with BuildSketch(Plane.XY.offset(-3.969739794)):
        with Locations((-36.408943925, 32.5)):
            Rectangle(SKETCH_15_W, SKETCH_15_H)
    extrude(amount=-CUT_EXTRUDE_17_DEPTH, mode=Mode.SUBTRACT)


solid = part.part
